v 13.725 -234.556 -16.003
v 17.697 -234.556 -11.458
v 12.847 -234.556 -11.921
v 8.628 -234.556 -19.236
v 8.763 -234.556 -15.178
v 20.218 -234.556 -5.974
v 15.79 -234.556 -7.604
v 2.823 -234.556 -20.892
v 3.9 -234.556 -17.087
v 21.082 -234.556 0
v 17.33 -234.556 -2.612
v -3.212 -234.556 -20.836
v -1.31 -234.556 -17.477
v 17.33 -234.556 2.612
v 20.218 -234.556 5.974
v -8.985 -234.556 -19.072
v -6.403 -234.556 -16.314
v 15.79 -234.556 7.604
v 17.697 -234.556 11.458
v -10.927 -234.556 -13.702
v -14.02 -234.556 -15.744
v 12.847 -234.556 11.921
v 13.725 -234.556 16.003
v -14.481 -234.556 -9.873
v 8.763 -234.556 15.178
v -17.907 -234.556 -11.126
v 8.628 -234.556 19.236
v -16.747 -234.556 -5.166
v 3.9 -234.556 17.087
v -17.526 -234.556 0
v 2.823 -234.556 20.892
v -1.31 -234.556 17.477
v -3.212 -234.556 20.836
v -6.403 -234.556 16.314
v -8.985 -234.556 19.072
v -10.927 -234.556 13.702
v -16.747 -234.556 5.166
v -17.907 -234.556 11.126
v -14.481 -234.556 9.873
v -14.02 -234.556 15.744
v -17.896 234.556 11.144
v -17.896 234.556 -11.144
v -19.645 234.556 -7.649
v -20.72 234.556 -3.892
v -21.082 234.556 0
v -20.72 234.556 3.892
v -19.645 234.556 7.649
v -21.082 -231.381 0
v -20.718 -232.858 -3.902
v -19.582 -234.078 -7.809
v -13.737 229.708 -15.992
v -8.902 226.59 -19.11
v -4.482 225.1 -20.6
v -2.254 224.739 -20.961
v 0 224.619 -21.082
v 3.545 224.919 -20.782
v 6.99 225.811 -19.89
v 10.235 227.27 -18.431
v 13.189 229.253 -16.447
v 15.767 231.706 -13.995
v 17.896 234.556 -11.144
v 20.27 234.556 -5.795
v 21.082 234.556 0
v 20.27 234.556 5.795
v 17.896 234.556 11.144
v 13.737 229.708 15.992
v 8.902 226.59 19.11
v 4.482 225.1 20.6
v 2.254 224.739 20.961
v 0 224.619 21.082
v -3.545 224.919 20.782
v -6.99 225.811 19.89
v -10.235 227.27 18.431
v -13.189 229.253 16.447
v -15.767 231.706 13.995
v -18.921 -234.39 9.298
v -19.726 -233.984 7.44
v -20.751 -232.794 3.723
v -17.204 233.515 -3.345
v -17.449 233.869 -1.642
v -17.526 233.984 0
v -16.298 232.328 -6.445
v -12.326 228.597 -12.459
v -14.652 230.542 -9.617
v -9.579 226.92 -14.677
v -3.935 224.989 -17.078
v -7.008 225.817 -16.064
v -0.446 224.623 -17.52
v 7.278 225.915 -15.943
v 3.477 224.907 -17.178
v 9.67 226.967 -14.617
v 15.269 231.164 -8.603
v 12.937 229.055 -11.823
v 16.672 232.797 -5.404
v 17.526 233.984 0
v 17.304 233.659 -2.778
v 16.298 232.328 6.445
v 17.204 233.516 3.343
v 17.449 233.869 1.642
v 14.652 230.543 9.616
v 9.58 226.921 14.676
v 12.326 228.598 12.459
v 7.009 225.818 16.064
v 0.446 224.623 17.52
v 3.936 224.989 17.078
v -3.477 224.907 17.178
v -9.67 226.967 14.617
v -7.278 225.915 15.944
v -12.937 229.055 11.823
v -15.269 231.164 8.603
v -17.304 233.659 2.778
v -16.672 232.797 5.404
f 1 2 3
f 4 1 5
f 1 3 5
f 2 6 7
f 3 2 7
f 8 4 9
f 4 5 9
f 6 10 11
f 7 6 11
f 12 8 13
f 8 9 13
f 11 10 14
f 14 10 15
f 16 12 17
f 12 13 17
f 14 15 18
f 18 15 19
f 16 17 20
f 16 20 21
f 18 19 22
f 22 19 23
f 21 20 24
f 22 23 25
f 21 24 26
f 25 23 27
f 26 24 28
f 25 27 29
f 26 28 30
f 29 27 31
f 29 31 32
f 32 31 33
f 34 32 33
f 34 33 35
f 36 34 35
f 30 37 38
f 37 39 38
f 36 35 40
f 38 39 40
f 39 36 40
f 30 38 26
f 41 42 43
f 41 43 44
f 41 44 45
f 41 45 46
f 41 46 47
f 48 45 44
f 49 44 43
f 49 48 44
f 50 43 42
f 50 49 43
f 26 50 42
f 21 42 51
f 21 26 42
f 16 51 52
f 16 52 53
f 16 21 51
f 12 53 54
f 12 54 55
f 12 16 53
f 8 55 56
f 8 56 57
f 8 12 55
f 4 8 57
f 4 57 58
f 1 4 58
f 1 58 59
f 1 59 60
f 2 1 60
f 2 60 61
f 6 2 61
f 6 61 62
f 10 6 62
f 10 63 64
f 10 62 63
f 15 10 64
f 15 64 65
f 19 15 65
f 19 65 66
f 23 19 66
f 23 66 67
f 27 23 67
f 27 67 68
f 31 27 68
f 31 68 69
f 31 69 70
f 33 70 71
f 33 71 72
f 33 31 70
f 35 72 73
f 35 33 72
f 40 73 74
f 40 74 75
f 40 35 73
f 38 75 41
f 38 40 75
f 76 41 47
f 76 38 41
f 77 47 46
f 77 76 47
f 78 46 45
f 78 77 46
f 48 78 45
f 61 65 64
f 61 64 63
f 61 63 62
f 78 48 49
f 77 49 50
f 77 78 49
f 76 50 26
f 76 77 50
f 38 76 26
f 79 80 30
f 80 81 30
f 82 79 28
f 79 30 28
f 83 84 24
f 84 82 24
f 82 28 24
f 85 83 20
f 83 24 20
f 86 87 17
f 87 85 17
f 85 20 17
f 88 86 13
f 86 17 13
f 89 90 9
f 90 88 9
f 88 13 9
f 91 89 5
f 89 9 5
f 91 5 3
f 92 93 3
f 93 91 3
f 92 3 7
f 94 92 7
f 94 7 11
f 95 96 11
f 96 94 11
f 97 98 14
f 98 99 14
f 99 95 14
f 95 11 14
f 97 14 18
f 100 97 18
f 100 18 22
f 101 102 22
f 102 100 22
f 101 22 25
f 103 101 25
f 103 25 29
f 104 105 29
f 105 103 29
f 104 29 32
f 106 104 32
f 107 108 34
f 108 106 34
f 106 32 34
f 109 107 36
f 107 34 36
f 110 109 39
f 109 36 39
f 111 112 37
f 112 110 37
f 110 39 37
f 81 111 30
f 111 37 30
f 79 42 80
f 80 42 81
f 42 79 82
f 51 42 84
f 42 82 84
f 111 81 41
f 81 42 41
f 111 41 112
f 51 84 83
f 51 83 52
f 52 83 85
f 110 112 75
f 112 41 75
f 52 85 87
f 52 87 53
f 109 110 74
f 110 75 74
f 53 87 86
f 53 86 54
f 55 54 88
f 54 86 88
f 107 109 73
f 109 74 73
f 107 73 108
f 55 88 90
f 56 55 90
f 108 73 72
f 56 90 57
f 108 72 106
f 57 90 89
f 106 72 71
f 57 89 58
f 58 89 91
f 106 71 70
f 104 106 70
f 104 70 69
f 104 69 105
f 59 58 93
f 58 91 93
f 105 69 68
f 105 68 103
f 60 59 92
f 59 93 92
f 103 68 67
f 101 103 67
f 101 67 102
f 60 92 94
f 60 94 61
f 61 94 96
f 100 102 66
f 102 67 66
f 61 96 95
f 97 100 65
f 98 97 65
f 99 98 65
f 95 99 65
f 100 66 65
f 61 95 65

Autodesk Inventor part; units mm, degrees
ref_plane "YZ Plane" through (0, 0, 0) normal (1, 0, 0) x (0, 1, 0)
ref_plane "XZ Plane" through (0, 0, 0) normal (0, 1, 0) x (-1, 0, 0)
ref_plane "XY Plane" through (0, 0, 0) normal (0, 0, 1) x (1, 0, 0)
sketch "Sketch1" plane through (0, 0, 0) normal (0, 1, 0) x (-1, 0, 0)
  circle A0 centre (0, 0) radius 21.082
  circle A1 centre (0, 0) radius 17.526
  dimension "d0" = 42.164
  dimension "d1" = 35.052
extrude "Extrusion1" add sketch "Sketch1" along normal mid plane 469.1126
sketch "Sketch2" plane through (0, 0, 0) normal (0, 0, 1) x (1, 0, 0)
  circle A0 centre (0, 245.7006) radius 21.082
  line L0 (21.082, 234.5563) -> (-21.082, 234.5563) projected
  line L1 (-21.082, -234.5563) -> (21.082, -234.5563) projected
  line L2 (-21.082, -234.5563) -> (-21.082, 234.5563) projected
  arc A1 (-21.082, -231.3813) -> (-17.907, -234.5563) centre (-17.907, -231.3813) ccw
  point P0 (0, 0)
  dimension "d4" = 42.164
  dimension "d6" = 11.1442
  dimension "d7" = 6.35
extrude "Extrusion2" cut sketch "Sketch2" against normal through all both and the other way through all
properties part number "FE-110-002 Upright Middle Section" material "Aluminum 6061"
